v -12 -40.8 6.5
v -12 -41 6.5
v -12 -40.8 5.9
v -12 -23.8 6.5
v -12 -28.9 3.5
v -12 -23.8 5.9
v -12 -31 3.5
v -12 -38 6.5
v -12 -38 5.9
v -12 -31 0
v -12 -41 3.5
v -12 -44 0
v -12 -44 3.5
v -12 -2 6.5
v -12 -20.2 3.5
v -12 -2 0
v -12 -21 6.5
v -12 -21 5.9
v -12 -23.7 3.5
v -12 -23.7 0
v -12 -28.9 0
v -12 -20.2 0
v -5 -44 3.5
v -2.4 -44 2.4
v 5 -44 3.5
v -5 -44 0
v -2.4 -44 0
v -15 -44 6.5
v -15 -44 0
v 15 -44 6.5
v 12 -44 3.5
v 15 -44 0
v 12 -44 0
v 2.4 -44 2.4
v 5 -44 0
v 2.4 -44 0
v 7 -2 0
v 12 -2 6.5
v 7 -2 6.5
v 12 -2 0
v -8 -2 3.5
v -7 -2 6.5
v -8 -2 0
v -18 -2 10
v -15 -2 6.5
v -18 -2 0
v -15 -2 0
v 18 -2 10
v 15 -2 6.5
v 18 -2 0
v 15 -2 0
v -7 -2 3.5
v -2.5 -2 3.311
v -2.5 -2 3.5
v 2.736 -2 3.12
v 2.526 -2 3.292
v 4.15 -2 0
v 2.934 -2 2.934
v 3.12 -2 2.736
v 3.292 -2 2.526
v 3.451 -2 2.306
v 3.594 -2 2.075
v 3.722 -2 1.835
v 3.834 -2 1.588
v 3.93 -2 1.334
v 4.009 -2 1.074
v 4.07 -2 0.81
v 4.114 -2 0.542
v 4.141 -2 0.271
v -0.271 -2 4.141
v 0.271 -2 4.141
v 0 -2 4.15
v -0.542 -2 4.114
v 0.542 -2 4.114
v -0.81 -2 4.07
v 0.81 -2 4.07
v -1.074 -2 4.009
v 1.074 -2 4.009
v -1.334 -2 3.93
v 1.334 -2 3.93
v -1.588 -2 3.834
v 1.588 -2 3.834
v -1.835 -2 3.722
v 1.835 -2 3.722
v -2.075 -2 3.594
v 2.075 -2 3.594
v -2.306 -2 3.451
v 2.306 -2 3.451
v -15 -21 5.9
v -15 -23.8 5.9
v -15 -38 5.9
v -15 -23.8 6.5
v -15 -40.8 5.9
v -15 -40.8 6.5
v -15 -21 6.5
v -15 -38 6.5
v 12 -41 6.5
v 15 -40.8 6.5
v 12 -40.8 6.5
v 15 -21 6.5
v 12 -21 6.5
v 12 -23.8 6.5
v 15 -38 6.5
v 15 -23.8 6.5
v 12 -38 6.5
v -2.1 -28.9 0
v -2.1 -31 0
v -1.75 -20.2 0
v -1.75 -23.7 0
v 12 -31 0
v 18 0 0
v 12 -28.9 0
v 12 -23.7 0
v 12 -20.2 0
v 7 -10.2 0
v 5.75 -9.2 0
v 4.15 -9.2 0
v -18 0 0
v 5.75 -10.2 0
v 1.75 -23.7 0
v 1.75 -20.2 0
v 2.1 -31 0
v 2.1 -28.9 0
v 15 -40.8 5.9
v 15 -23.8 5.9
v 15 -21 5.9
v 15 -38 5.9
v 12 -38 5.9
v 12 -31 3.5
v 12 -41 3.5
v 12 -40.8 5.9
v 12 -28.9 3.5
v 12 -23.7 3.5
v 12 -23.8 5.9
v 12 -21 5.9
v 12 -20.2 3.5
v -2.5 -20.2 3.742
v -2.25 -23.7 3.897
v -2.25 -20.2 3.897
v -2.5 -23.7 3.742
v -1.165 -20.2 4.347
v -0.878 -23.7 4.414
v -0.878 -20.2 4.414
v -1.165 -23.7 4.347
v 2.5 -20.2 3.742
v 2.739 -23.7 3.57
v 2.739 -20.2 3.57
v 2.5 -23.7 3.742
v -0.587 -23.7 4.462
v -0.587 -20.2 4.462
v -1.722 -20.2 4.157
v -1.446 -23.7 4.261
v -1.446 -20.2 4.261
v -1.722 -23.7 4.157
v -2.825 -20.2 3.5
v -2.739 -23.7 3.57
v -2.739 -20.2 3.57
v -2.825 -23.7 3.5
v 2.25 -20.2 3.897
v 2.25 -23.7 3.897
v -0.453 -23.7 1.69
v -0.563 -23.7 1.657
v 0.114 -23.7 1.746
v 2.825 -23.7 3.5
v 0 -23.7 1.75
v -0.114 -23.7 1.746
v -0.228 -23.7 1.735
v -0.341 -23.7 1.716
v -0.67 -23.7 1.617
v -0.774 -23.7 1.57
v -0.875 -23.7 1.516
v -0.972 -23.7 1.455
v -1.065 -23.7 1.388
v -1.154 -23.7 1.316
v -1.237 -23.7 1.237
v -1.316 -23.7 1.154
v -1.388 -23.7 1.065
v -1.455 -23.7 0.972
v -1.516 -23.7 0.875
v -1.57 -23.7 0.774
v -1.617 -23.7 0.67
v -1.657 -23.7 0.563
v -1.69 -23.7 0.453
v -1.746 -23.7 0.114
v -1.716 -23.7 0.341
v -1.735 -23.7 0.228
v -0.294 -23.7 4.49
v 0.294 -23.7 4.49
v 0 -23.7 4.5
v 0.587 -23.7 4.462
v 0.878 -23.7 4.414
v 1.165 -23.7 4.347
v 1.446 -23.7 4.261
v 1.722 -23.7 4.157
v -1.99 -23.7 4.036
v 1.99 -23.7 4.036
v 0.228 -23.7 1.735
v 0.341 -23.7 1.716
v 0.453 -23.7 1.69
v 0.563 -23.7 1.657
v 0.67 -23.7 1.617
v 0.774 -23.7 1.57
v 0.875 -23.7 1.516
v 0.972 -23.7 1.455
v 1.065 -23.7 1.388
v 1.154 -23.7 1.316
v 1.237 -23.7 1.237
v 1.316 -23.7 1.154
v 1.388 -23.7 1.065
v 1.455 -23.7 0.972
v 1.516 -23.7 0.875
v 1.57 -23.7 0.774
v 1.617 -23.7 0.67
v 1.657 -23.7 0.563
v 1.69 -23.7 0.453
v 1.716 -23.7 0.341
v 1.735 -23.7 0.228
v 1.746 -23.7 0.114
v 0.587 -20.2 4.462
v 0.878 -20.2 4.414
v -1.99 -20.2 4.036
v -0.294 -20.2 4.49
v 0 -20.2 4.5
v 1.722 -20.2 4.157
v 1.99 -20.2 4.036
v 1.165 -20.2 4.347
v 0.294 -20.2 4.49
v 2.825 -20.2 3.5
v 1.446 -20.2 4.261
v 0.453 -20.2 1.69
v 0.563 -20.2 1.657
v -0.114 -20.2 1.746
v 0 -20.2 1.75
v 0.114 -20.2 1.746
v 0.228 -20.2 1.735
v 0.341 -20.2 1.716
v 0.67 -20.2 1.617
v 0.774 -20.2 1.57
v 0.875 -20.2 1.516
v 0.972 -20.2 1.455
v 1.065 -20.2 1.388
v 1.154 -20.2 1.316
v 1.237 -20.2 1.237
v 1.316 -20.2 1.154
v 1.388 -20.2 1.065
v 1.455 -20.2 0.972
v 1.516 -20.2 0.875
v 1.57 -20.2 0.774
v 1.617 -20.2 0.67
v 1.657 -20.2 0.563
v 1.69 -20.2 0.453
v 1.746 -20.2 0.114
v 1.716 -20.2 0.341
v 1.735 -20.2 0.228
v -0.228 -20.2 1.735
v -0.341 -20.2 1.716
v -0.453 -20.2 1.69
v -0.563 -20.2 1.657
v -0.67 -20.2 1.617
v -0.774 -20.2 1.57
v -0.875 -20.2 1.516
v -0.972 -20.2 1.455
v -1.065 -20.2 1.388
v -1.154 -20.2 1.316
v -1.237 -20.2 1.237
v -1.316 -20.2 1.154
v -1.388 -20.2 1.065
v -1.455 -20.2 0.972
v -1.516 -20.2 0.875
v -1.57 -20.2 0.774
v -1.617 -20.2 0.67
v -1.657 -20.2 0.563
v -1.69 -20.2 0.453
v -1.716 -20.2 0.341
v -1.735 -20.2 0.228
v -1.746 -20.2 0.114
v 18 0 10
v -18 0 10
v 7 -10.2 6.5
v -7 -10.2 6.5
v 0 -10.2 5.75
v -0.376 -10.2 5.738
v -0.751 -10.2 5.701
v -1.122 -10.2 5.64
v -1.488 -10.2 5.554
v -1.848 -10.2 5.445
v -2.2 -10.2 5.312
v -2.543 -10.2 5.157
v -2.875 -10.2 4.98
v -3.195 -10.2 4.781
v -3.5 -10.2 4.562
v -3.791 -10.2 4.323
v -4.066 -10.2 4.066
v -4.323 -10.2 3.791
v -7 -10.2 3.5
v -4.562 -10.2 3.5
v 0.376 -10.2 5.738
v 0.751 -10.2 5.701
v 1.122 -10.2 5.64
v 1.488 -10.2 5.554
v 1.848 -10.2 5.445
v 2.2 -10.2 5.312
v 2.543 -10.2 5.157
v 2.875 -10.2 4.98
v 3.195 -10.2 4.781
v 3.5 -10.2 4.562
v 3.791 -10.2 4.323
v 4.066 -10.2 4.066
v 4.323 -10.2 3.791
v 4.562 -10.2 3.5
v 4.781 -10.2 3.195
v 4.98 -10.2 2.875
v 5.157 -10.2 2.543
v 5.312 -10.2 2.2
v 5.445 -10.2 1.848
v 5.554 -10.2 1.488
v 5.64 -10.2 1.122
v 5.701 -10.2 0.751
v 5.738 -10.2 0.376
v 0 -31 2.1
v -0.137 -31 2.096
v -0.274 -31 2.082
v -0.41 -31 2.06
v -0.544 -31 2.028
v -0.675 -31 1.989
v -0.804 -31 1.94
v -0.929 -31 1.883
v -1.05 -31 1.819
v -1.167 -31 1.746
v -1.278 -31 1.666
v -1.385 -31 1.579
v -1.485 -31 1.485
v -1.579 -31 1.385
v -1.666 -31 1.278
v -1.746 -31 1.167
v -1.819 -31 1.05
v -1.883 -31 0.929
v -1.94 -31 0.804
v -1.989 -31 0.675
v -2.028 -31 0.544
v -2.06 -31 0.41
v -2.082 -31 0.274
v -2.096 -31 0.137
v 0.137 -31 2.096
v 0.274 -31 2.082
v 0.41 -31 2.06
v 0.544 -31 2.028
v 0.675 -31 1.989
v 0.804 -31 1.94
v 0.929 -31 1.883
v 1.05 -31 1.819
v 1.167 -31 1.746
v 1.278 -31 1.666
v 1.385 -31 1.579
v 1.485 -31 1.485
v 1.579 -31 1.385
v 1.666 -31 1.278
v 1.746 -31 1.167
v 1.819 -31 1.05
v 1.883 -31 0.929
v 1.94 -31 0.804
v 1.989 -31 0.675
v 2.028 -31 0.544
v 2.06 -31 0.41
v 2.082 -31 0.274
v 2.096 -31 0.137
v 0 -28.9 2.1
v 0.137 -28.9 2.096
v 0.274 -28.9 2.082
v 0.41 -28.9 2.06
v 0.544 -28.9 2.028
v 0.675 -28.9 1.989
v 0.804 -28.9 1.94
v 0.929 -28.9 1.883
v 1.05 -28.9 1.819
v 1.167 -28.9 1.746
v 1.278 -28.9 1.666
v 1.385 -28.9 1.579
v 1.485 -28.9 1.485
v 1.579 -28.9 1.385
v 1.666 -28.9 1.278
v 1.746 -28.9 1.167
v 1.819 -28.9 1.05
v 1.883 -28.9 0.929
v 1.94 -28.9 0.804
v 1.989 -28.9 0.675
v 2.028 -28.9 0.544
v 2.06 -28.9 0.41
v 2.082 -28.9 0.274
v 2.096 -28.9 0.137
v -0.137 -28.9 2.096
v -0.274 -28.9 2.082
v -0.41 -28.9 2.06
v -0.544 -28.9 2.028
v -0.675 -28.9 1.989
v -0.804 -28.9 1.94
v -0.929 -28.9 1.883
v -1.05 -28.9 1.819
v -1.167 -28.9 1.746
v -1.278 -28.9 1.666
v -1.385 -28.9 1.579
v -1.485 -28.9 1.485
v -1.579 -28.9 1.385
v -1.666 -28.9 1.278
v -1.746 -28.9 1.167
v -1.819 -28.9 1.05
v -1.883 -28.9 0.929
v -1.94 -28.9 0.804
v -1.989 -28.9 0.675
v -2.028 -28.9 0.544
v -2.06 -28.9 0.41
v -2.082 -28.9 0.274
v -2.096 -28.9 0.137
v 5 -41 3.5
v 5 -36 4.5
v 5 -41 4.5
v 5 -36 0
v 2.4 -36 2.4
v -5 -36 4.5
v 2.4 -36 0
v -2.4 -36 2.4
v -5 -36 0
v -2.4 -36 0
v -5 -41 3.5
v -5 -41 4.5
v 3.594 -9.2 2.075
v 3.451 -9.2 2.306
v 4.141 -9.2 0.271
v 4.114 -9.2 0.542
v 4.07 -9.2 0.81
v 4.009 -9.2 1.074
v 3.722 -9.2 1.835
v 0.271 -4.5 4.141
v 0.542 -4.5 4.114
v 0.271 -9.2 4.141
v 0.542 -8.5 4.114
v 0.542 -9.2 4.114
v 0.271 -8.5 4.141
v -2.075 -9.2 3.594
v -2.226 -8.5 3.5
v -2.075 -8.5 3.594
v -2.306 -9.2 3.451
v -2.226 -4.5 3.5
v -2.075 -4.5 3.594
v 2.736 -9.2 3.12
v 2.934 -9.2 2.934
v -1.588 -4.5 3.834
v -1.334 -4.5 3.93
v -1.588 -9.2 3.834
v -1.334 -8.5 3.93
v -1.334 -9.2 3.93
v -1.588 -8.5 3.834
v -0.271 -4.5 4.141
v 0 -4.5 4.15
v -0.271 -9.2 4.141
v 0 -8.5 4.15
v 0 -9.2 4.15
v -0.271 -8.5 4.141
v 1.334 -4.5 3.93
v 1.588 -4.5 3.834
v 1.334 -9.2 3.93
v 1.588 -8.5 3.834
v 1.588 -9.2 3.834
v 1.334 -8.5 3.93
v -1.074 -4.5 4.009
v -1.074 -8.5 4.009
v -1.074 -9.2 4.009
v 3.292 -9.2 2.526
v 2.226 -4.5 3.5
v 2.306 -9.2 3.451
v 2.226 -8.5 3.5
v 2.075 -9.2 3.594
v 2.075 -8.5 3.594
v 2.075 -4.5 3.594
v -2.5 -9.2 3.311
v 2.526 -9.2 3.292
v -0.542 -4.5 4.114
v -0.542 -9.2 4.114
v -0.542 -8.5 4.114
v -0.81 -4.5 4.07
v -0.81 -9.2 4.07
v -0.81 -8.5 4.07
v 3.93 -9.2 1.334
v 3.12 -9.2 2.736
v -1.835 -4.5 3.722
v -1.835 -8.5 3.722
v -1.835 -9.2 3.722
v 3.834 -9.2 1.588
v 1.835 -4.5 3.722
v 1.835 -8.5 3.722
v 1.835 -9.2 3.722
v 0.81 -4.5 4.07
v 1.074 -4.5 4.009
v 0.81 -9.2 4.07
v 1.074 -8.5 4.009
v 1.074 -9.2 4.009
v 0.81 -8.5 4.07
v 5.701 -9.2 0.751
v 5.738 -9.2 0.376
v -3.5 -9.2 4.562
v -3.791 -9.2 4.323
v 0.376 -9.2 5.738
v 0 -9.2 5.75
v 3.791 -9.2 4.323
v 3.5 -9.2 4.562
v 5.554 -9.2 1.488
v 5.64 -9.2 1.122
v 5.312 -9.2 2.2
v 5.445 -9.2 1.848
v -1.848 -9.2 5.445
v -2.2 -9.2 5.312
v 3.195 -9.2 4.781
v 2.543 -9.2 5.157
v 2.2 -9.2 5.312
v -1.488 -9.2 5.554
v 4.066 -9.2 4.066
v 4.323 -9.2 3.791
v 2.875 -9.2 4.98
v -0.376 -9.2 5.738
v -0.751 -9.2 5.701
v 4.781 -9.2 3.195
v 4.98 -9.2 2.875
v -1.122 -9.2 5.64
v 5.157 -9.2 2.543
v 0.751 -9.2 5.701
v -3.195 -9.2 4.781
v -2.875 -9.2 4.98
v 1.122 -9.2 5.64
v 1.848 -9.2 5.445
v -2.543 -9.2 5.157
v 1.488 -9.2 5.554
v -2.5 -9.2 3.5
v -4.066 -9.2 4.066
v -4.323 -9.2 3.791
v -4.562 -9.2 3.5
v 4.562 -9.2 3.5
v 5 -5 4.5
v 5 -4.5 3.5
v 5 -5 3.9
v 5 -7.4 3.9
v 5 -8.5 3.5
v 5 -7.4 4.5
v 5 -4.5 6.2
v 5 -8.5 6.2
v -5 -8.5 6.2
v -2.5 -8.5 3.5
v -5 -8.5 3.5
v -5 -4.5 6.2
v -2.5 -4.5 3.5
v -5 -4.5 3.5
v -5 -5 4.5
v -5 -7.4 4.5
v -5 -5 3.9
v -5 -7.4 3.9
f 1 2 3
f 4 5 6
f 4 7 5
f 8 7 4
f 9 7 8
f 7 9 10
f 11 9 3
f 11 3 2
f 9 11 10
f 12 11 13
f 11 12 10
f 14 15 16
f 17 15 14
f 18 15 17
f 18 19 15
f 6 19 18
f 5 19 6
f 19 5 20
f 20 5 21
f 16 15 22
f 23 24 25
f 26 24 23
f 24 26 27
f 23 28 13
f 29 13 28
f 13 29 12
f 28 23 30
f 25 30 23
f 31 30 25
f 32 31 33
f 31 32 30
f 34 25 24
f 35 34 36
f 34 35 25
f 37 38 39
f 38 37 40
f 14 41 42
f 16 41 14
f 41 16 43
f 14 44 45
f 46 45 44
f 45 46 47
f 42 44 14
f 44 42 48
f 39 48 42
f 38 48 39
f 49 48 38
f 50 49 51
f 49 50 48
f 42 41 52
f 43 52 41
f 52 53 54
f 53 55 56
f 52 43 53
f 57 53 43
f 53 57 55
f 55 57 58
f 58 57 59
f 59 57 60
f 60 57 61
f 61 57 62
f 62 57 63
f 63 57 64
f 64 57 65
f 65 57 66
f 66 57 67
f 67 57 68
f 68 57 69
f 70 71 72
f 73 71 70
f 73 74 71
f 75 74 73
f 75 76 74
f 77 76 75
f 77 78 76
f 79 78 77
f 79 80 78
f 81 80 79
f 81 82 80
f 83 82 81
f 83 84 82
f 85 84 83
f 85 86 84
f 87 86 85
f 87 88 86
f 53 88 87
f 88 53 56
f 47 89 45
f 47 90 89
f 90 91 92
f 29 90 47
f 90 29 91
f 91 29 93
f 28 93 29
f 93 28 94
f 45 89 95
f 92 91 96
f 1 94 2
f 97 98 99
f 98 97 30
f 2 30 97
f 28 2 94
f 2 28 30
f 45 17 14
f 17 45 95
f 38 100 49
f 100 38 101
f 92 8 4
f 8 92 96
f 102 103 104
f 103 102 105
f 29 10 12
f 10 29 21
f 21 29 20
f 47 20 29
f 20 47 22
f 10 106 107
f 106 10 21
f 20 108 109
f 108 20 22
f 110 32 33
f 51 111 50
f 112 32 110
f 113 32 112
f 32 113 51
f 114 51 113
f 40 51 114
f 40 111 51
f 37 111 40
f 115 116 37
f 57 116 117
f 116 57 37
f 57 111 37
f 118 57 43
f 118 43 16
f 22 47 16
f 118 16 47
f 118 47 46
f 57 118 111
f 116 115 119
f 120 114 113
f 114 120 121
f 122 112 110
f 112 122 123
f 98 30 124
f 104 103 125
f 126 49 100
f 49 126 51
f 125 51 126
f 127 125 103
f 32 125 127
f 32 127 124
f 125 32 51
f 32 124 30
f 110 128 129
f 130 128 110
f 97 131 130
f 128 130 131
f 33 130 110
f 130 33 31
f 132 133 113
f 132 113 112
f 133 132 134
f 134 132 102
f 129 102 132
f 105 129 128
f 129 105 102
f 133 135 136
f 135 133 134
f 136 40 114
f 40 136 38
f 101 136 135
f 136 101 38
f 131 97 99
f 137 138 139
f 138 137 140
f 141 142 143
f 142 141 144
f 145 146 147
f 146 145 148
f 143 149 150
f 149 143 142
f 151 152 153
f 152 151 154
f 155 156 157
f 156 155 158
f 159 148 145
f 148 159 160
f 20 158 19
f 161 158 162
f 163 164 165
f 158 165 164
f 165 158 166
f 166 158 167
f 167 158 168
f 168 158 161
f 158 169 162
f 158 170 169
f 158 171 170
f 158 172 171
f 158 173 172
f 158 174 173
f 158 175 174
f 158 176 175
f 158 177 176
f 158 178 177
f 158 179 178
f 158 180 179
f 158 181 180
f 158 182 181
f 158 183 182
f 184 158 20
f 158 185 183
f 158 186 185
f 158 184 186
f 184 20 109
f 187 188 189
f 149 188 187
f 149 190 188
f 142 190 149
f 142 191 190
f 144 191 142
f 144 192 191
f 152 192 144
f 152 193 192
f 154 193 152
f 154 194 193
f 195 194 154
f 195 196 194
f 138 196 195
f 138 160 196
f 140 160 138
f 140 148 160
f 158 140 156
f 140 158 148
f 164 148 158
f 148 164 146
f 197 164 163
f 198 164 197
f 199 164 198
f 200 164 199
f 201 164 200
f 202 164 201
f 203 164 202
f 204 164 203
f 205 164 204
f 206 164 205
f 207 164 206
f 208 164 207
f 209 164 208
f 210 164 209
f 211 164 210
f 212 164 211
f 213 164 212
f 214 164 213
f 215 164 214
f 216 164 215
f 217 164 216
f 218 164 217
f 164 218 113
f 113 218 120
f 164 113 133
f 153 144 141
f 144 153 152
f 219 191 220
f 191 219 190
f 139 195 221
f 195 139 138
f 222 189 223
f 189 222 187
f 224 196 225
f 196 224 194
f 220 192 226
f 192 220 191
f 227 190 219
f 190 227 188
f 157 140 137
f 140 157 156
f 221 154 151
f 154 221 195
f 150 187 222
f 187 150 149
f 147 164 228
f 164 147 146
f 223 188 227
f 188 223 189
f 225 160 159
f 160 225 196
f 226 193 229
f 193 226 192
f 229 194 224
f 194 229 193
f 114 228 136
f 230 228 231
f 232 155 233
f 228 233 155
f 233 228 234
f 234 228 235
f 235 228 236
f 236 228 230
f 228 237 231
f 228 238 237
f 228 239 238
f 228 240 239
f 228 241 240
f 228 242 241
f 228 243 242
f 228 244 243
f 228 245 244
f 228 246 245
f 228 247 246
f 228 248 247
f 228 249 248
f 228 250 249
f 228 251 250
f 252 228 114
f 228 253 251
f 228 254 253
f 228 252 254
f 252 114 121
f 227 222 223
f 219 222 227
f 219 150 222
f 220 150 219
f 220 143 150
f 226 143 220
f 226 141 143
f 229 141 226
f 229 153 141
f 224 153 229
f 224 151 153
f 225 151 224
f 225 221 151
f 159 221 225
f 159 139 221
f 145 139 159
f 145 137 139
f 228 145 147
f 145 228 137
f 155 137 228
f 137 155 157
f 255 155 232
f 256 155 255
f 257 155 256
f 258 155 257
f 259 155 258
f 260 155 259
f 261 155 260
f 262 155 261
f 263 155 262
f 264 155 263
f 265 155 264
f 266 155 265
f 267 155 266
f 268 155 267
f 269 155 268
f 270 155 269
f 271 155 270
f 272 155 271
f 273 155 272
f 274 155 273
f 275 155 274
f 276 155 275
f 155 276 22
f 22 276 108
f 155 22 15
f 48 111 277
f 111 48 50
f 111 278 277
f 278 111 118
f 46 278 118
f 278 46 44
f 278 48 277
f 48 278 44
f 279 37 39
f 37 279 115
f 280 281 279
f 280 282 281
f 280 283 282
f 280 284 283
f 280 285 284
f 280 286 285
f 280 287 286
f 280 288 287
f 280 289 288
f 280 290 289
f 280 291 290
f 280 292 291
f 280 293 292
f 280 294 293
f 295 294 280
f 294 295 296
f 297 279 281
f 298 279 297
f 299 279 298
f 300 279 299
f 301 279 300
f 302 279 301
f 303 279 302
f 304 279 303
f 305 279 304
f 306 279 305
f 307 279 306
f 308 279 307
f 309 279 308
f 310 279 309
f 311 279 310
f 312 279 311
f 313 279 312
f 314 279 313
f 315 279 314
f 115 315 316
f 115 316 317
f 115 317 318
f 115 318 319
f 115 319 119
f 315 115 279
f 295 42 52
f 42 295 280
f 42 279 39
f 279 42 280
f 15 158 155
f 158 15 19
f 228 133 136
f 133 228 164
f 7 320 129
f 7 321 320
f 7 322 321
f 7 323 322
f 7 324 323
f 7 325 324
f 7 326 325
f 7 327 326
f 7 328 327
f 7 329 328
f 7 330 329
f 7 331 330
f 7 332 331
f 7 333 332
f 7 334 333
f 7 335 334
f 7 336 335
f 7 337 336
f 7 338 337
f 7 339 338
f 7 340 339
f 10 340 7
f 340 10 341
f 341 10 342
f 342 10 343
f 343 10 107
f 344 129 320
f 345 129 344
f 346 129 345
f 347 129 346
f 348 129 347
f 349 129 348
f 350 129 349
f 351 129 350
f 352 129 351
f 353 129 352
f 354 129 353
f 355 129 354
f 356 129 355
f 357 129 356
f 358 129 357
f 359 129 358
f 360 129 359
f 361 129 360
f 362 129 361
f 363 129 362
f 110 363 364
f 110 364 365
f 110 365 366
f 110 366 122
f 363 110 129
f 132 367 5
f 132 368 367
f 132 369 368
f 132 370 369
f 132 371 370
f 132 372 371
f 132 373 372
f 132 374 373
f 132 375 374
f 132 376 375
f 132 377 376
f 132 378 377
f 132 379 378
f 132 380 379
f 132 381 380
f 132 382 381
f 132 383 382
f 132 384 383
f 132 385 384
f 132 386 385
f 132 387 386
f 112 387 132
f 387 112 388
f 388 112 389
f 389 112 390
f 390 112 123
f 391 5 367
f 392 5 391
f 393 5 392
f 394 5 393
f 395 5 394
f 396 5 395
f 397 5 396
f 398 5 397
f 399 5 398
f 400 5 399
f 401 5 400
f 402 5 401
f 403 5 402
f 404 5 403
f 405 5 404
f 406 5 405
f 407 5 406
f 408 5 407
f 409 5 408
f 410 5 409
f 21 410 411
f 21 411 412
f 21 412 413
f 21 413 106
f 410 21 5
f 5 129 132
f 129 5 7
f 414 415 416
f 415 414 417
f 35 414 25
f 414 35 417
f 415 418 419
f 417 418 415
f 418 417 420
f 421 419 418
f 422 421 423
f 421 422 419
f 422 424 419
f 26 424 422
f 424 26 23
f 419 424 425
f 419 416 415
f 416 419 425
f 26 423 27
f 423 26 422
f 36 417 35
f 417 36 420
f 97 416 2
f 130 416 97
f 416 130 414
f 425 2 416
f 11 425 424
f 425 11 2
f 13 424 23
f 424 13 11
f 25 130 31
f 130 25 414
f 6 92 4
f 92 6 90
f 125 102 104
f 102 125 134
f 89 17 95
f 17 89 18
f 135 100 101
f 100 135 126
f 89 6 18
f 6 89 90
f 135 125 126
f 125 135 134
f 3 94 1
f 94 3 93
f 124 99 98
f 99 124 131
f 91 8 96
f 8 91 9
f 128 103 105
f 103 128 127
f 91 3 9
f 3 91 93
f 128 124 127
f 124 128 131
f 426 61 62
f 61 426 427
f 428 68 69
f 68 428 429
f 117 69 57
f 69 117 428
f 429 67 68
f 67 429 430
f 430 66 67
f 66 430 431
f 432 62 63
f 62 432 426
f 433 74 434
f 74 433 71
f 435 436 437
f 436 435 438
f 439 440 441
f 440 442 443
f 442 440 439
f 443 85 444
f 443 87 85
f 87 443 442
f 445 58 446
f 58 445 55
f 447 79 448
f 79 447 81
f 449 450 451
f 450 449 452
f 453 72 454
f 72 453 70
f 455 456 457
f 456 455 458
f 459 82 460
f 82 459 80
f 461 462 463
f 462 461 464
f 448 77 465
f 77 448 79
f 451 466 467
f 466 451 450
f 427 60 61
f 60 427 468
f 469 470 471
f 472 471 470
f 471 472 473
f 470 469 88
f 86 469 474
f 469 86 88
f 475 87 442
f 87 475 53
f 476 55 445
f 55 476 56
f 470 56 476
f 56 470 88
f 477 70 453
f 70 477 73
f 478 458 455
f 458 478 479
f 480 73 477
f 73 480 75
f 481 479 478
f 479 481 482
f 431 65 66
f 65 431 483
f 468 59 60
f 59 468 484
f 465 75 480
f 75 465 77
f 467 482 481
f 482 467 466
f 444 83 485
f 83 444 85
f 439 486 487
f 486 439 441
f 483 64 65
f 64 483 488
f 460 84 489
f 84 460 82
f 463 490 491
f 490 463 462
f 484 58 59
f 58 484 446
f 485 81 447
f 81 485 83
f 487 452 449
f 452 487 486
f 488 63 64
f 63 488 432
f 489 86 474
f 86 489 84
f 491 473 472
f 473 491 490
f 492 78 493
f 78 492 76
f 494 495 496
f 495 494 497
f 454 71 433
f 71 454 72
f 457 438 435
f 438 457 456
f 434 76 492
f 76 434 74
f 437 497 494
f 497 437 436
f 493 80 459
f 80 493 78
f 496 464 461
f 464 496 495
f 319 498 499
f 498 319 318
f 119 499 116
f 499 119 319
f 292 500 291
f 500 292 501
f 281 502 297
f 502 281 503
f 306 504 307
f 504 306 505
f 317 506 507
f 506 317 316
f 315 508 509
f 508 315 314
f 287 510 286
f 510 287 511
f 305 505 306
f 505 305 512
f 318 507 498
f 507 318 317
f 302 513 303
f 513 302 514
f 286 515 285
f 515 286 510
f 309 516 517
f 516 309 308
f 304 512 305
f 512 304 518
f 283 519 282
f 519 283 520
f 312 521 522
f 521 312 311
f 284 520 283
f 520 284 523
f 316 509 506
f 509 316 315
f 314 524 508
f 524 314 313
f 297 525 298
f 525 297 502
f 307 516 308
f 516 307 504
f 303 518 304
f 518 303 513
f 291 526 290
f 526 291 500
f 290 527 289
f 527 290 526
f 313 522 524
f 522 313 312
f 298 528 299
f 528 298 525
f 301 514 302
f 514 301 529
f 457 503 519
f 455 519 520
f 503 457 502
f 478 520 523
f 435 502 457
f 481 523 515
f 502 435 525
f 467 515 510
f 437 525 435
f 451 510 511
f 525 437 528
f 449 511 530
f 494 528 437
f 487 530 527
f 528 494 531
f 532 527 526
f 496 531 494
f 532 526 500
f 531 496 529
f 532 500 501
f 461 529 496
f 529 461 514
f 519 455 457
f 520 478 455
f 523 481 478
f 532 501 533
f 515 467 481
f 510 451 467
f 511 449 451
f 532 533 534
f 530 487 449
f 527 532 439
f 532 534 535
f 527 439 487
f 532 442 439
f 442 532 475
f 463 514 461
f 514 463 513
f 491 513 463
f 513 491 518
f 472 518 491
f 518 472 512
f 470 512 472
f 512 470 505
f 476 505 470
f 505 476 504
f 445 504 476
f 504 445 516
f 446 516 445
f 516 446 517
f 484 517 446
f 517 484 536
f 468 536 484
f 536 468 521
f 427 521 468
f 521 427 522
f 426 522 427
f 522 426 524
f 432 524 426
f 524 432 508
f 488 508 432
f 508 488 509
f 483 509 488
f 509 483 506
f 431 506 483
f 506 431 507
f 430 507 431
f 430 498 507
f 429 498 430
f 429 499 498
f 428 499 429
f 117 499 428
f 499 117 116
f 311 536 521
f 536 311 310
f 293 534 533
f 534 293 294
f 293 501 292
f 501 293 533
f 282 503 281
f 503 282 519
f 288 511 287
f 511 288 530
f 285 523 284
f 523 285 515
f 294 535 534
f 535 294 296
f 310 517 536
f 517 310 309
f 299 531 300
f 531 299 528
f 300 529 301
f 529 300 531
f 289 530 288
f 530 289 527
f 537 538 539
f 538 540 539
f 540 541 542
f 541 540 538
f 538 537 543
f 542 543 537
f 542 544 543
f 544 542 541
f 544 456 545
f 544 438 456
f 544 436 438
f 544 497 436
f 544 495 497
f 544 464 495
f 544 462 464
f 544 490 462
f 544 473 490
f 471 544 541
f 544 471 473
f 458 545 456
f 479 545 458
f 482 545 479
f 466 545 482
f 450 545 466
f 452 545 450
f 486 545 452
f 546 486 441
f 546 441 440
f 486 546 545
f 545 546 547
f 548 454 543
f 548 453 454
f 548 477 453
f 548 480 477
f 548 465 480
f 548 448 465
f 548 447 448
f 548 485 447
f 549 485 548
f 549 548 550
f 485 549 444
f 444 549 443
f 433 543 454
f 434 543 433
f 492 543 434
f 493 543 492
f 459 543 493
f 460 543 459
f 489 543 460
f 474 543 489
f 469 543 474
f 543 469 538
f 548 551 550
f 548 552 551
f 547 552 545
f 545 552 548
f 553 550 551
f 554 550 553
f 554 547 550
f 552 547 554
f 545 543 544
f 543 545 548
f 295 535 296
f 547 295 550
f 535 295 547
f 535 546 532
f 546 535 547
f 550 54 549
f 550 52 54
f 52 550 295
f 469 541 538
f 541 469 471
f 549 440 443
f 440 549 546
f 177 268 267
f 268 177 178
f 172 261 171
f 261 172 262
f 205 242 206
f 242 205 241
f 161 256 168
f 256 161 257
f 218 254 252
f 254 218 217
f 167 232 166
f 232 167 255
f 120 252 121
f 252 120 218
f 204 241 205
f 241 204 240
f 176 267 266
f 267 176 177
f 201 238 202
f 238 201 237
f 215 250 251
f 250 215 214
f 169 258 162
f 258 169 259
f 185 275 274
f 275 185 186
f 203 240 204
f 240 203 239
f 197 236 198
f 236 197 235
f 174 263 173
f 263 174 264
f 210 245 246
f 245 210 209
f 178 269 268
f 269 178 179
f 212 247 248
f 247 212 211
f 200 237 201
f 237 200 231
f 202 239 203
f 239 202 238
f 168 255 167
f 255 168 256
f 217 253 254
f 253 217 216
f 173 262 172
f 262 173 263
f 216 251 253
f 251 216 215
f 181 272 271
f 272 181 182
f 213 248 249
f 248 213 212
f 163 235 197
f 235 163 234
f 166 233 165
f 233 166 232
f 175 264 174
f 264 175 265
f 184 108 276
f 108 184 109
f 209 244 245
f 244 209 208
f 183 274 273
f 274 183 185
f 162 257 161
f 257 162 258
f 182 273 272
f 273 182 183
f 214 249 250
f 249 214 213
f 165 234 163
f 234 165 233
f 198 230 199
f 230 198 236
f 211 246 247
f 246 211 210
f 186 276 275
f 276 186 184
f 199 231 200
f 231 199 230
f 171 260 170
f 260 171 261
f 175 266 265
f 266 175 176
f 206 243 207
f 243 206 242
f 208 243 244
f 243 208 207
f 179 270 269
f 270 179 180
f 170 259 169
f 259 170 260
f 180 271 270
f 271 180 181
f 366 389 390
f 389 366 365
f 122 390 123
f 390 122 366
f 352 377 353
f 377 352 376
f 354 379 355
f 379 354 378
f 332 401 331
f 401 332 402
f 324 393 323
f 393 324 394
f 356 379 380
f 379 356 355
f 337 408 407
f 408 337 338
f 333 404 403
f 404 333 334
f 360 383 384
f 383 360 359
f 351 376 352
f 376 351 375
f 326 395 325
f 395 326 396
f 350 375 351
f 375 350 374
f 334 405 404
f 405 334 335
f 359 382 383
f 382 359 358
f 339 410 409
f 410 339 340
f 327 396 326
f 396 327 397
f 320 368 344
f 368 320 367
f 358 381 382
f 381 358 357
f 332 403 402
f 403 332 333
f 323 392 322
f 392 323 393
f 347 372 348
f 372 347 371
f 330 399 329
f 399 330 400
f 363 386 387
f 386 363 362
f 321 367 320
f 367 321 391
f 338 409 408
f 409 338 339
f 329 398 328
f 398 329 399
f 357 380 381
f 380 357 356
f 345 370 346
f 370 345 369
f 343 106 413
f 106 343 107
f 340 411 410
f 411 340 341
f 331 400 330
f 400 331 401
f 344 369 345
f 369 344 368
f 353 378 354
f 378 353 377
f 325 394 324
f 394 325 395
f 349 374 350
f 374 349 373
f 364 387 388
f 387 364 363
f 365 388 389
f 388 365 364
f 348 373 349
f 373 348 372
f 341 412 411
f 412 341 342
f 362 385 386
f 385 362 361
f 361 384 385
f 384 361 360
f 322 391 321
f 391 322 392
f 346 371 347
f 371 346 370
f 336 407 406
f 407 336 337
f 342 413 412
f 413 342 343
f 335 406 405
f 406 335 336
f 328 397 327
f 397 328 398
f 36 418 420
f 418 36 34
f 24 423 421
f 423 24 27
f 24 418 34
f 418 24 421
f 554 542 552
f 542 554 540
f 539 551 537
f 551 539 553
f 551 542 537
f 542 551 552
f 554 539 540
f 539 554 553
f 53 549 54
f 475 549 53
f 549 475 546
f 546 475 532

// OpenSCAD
// E-302 revision 4, mm. E-301 functional thread and foot retained.
// Source photo dimensions are NOT physical measurements of owner motors.
part="half-front";
pin_height=50;
tip_r=1.05; // Owner selected C (three identification notches), 2026-10-19.
$fn=96;
body_d=8.30;
pcb_half_width=3.5; // open side envelope, unmeasured PCB: check before closing
socket_bottom=13.2; // Remove 2 mm at motor end; bearing/drive seat stay fixed.
socket_top=19.5;
module cradle_half(){
 difference(){
  union(){
   translate([-18,0,0])cube([36,10,2]);
   for(x=[-15,12])translate([x,0,2])cube([3,6.5,42]);
   translate([-7,0,2])cube([14,6.5,8.2]);
   translate([-15,0,20.2])cube([30,3.5,3.5]);
   intersection(){translate([0,0,20.2])cylinder(d=9,h=3.5);translate([-5,0,20])cube([10,5,4]);}
   translate([-15,0,28.9])cube([30,3.5,2.1]);
   translate([-5,0,36])cube([10,4.5,8]);
   translate([-15,3.5,41])cube([30,3,3]);
  }
  translate([0,0,2])cylinder(d=body_d,h=10);
  translate([0,0,9.2])cylinder(d=11.5,h=1.1);
  // Clearance behind transverse flexure; rigid cradle stops frame closure.
  translate([-5,3.5,4.5])cube([10,2.7,4]);
  translate([0,0,19.9])cylinder(d=3.5,h=4.1);
  translate([0,0,28.8])cylinder(d=4.2,h=2.4);
  translate([-2.4,-2.4,35.9])cube([4.8,4.8,8.3]);
  // Keep elastic away from the motor spring and open PCB windows.
  for(z=[21,38])translate([-16,5.9,z])cube([32,2,2.8]);
 }
 // Transverse two-ended flexure: 10 mm bridge, .6 thick, 2.4 axial width.
 // Flat first bridging layer has anchors at both ends; nominal preload .10.
 translate([-5.2,3.9,5])cube([10.4,.6,2.4]);
}
// Cut AFTER adding spring: no spring or wall may cross the PCB envelope.
module frame_half(){
 difference(){
  cradle_half();
  translate([-8,-.01,2])cube([5.5,pcb_half_width+.01,8.5]);
 }
}
module bore_profile(){
 difference(){
  circle(d=2.5);
  // Rounded wall-integrated lobes, not a miniature involute gear.
  for(a=[0,120,240])rotate(a)translate([tip_r+.5,0])circle(r=.5);
 }
}
module cup(){
 difference(){
  union(){
   translate([-6.5,-6.5,24.2])cube([13,13,4.6]);
   translate([0,0,19.7])cylinder(d=3,h=4.51);
   translate([0,0,socket_bottom])cylinder(d=5,h=19.71-socket_bottom);
  }
  translate([-5.2,-5.2,26.2])cube([10.4,10.4,3]);
  translate([0,0,socket_bottom-.01])linear_extrude(socket_top-socket_bottom+.01)bore_profile();
  // Lead-in removes the first .5 mm of full-depth engagement.
  translate([0,0,socket_bottom-.01])cylinder(d1=2.9,d2=1.9,h=.51);
  // 1/2/3 external notches identify A/N/C, away from bearing and square socket.
  for(i=[0:(tip_r<.98?0:tip_r>1.02?2:1)])
   translate([-3+i*3,6.1,27])cube([1,1,2]);
 }
}
if(part=="half-front")rotate([90,0,0])frame_half();
if(part=="half-back")rotate([90,0,0])mirror([1,0,0])frame_half();
if(part=="cup")translate([0,0,28.8])rotate([180,0,0])cup();
if(part=="assembly") {frame_half();mirror([0,1,0])frame_half();cup();}

// Exact supplied E-301 meshes are retained as functional source geometry.
if(part=="screw")import("../../2026-10-17-microstepper-screw-pin/screw.stl");
if(part=="pin-18")import("../../2026-10-17-microstepper-screw-pin/pin.stl");
if(part=="pin-50")union(){
 import("../../2026-10-17-microstepper-screw-pin/pin.stl");
 // Overlap only the straight upper tube; threaded bottom and print foot unchanged.
 translate([0,0,17.9])difference(){
  translate([-2.2,-2.2,0])cube([4.4,4.4,pin_height-17.9]);
  translate([-1.76,-1.76,-.01])cube([3.52,3.52,pin_height-17.8]);
 }
}
